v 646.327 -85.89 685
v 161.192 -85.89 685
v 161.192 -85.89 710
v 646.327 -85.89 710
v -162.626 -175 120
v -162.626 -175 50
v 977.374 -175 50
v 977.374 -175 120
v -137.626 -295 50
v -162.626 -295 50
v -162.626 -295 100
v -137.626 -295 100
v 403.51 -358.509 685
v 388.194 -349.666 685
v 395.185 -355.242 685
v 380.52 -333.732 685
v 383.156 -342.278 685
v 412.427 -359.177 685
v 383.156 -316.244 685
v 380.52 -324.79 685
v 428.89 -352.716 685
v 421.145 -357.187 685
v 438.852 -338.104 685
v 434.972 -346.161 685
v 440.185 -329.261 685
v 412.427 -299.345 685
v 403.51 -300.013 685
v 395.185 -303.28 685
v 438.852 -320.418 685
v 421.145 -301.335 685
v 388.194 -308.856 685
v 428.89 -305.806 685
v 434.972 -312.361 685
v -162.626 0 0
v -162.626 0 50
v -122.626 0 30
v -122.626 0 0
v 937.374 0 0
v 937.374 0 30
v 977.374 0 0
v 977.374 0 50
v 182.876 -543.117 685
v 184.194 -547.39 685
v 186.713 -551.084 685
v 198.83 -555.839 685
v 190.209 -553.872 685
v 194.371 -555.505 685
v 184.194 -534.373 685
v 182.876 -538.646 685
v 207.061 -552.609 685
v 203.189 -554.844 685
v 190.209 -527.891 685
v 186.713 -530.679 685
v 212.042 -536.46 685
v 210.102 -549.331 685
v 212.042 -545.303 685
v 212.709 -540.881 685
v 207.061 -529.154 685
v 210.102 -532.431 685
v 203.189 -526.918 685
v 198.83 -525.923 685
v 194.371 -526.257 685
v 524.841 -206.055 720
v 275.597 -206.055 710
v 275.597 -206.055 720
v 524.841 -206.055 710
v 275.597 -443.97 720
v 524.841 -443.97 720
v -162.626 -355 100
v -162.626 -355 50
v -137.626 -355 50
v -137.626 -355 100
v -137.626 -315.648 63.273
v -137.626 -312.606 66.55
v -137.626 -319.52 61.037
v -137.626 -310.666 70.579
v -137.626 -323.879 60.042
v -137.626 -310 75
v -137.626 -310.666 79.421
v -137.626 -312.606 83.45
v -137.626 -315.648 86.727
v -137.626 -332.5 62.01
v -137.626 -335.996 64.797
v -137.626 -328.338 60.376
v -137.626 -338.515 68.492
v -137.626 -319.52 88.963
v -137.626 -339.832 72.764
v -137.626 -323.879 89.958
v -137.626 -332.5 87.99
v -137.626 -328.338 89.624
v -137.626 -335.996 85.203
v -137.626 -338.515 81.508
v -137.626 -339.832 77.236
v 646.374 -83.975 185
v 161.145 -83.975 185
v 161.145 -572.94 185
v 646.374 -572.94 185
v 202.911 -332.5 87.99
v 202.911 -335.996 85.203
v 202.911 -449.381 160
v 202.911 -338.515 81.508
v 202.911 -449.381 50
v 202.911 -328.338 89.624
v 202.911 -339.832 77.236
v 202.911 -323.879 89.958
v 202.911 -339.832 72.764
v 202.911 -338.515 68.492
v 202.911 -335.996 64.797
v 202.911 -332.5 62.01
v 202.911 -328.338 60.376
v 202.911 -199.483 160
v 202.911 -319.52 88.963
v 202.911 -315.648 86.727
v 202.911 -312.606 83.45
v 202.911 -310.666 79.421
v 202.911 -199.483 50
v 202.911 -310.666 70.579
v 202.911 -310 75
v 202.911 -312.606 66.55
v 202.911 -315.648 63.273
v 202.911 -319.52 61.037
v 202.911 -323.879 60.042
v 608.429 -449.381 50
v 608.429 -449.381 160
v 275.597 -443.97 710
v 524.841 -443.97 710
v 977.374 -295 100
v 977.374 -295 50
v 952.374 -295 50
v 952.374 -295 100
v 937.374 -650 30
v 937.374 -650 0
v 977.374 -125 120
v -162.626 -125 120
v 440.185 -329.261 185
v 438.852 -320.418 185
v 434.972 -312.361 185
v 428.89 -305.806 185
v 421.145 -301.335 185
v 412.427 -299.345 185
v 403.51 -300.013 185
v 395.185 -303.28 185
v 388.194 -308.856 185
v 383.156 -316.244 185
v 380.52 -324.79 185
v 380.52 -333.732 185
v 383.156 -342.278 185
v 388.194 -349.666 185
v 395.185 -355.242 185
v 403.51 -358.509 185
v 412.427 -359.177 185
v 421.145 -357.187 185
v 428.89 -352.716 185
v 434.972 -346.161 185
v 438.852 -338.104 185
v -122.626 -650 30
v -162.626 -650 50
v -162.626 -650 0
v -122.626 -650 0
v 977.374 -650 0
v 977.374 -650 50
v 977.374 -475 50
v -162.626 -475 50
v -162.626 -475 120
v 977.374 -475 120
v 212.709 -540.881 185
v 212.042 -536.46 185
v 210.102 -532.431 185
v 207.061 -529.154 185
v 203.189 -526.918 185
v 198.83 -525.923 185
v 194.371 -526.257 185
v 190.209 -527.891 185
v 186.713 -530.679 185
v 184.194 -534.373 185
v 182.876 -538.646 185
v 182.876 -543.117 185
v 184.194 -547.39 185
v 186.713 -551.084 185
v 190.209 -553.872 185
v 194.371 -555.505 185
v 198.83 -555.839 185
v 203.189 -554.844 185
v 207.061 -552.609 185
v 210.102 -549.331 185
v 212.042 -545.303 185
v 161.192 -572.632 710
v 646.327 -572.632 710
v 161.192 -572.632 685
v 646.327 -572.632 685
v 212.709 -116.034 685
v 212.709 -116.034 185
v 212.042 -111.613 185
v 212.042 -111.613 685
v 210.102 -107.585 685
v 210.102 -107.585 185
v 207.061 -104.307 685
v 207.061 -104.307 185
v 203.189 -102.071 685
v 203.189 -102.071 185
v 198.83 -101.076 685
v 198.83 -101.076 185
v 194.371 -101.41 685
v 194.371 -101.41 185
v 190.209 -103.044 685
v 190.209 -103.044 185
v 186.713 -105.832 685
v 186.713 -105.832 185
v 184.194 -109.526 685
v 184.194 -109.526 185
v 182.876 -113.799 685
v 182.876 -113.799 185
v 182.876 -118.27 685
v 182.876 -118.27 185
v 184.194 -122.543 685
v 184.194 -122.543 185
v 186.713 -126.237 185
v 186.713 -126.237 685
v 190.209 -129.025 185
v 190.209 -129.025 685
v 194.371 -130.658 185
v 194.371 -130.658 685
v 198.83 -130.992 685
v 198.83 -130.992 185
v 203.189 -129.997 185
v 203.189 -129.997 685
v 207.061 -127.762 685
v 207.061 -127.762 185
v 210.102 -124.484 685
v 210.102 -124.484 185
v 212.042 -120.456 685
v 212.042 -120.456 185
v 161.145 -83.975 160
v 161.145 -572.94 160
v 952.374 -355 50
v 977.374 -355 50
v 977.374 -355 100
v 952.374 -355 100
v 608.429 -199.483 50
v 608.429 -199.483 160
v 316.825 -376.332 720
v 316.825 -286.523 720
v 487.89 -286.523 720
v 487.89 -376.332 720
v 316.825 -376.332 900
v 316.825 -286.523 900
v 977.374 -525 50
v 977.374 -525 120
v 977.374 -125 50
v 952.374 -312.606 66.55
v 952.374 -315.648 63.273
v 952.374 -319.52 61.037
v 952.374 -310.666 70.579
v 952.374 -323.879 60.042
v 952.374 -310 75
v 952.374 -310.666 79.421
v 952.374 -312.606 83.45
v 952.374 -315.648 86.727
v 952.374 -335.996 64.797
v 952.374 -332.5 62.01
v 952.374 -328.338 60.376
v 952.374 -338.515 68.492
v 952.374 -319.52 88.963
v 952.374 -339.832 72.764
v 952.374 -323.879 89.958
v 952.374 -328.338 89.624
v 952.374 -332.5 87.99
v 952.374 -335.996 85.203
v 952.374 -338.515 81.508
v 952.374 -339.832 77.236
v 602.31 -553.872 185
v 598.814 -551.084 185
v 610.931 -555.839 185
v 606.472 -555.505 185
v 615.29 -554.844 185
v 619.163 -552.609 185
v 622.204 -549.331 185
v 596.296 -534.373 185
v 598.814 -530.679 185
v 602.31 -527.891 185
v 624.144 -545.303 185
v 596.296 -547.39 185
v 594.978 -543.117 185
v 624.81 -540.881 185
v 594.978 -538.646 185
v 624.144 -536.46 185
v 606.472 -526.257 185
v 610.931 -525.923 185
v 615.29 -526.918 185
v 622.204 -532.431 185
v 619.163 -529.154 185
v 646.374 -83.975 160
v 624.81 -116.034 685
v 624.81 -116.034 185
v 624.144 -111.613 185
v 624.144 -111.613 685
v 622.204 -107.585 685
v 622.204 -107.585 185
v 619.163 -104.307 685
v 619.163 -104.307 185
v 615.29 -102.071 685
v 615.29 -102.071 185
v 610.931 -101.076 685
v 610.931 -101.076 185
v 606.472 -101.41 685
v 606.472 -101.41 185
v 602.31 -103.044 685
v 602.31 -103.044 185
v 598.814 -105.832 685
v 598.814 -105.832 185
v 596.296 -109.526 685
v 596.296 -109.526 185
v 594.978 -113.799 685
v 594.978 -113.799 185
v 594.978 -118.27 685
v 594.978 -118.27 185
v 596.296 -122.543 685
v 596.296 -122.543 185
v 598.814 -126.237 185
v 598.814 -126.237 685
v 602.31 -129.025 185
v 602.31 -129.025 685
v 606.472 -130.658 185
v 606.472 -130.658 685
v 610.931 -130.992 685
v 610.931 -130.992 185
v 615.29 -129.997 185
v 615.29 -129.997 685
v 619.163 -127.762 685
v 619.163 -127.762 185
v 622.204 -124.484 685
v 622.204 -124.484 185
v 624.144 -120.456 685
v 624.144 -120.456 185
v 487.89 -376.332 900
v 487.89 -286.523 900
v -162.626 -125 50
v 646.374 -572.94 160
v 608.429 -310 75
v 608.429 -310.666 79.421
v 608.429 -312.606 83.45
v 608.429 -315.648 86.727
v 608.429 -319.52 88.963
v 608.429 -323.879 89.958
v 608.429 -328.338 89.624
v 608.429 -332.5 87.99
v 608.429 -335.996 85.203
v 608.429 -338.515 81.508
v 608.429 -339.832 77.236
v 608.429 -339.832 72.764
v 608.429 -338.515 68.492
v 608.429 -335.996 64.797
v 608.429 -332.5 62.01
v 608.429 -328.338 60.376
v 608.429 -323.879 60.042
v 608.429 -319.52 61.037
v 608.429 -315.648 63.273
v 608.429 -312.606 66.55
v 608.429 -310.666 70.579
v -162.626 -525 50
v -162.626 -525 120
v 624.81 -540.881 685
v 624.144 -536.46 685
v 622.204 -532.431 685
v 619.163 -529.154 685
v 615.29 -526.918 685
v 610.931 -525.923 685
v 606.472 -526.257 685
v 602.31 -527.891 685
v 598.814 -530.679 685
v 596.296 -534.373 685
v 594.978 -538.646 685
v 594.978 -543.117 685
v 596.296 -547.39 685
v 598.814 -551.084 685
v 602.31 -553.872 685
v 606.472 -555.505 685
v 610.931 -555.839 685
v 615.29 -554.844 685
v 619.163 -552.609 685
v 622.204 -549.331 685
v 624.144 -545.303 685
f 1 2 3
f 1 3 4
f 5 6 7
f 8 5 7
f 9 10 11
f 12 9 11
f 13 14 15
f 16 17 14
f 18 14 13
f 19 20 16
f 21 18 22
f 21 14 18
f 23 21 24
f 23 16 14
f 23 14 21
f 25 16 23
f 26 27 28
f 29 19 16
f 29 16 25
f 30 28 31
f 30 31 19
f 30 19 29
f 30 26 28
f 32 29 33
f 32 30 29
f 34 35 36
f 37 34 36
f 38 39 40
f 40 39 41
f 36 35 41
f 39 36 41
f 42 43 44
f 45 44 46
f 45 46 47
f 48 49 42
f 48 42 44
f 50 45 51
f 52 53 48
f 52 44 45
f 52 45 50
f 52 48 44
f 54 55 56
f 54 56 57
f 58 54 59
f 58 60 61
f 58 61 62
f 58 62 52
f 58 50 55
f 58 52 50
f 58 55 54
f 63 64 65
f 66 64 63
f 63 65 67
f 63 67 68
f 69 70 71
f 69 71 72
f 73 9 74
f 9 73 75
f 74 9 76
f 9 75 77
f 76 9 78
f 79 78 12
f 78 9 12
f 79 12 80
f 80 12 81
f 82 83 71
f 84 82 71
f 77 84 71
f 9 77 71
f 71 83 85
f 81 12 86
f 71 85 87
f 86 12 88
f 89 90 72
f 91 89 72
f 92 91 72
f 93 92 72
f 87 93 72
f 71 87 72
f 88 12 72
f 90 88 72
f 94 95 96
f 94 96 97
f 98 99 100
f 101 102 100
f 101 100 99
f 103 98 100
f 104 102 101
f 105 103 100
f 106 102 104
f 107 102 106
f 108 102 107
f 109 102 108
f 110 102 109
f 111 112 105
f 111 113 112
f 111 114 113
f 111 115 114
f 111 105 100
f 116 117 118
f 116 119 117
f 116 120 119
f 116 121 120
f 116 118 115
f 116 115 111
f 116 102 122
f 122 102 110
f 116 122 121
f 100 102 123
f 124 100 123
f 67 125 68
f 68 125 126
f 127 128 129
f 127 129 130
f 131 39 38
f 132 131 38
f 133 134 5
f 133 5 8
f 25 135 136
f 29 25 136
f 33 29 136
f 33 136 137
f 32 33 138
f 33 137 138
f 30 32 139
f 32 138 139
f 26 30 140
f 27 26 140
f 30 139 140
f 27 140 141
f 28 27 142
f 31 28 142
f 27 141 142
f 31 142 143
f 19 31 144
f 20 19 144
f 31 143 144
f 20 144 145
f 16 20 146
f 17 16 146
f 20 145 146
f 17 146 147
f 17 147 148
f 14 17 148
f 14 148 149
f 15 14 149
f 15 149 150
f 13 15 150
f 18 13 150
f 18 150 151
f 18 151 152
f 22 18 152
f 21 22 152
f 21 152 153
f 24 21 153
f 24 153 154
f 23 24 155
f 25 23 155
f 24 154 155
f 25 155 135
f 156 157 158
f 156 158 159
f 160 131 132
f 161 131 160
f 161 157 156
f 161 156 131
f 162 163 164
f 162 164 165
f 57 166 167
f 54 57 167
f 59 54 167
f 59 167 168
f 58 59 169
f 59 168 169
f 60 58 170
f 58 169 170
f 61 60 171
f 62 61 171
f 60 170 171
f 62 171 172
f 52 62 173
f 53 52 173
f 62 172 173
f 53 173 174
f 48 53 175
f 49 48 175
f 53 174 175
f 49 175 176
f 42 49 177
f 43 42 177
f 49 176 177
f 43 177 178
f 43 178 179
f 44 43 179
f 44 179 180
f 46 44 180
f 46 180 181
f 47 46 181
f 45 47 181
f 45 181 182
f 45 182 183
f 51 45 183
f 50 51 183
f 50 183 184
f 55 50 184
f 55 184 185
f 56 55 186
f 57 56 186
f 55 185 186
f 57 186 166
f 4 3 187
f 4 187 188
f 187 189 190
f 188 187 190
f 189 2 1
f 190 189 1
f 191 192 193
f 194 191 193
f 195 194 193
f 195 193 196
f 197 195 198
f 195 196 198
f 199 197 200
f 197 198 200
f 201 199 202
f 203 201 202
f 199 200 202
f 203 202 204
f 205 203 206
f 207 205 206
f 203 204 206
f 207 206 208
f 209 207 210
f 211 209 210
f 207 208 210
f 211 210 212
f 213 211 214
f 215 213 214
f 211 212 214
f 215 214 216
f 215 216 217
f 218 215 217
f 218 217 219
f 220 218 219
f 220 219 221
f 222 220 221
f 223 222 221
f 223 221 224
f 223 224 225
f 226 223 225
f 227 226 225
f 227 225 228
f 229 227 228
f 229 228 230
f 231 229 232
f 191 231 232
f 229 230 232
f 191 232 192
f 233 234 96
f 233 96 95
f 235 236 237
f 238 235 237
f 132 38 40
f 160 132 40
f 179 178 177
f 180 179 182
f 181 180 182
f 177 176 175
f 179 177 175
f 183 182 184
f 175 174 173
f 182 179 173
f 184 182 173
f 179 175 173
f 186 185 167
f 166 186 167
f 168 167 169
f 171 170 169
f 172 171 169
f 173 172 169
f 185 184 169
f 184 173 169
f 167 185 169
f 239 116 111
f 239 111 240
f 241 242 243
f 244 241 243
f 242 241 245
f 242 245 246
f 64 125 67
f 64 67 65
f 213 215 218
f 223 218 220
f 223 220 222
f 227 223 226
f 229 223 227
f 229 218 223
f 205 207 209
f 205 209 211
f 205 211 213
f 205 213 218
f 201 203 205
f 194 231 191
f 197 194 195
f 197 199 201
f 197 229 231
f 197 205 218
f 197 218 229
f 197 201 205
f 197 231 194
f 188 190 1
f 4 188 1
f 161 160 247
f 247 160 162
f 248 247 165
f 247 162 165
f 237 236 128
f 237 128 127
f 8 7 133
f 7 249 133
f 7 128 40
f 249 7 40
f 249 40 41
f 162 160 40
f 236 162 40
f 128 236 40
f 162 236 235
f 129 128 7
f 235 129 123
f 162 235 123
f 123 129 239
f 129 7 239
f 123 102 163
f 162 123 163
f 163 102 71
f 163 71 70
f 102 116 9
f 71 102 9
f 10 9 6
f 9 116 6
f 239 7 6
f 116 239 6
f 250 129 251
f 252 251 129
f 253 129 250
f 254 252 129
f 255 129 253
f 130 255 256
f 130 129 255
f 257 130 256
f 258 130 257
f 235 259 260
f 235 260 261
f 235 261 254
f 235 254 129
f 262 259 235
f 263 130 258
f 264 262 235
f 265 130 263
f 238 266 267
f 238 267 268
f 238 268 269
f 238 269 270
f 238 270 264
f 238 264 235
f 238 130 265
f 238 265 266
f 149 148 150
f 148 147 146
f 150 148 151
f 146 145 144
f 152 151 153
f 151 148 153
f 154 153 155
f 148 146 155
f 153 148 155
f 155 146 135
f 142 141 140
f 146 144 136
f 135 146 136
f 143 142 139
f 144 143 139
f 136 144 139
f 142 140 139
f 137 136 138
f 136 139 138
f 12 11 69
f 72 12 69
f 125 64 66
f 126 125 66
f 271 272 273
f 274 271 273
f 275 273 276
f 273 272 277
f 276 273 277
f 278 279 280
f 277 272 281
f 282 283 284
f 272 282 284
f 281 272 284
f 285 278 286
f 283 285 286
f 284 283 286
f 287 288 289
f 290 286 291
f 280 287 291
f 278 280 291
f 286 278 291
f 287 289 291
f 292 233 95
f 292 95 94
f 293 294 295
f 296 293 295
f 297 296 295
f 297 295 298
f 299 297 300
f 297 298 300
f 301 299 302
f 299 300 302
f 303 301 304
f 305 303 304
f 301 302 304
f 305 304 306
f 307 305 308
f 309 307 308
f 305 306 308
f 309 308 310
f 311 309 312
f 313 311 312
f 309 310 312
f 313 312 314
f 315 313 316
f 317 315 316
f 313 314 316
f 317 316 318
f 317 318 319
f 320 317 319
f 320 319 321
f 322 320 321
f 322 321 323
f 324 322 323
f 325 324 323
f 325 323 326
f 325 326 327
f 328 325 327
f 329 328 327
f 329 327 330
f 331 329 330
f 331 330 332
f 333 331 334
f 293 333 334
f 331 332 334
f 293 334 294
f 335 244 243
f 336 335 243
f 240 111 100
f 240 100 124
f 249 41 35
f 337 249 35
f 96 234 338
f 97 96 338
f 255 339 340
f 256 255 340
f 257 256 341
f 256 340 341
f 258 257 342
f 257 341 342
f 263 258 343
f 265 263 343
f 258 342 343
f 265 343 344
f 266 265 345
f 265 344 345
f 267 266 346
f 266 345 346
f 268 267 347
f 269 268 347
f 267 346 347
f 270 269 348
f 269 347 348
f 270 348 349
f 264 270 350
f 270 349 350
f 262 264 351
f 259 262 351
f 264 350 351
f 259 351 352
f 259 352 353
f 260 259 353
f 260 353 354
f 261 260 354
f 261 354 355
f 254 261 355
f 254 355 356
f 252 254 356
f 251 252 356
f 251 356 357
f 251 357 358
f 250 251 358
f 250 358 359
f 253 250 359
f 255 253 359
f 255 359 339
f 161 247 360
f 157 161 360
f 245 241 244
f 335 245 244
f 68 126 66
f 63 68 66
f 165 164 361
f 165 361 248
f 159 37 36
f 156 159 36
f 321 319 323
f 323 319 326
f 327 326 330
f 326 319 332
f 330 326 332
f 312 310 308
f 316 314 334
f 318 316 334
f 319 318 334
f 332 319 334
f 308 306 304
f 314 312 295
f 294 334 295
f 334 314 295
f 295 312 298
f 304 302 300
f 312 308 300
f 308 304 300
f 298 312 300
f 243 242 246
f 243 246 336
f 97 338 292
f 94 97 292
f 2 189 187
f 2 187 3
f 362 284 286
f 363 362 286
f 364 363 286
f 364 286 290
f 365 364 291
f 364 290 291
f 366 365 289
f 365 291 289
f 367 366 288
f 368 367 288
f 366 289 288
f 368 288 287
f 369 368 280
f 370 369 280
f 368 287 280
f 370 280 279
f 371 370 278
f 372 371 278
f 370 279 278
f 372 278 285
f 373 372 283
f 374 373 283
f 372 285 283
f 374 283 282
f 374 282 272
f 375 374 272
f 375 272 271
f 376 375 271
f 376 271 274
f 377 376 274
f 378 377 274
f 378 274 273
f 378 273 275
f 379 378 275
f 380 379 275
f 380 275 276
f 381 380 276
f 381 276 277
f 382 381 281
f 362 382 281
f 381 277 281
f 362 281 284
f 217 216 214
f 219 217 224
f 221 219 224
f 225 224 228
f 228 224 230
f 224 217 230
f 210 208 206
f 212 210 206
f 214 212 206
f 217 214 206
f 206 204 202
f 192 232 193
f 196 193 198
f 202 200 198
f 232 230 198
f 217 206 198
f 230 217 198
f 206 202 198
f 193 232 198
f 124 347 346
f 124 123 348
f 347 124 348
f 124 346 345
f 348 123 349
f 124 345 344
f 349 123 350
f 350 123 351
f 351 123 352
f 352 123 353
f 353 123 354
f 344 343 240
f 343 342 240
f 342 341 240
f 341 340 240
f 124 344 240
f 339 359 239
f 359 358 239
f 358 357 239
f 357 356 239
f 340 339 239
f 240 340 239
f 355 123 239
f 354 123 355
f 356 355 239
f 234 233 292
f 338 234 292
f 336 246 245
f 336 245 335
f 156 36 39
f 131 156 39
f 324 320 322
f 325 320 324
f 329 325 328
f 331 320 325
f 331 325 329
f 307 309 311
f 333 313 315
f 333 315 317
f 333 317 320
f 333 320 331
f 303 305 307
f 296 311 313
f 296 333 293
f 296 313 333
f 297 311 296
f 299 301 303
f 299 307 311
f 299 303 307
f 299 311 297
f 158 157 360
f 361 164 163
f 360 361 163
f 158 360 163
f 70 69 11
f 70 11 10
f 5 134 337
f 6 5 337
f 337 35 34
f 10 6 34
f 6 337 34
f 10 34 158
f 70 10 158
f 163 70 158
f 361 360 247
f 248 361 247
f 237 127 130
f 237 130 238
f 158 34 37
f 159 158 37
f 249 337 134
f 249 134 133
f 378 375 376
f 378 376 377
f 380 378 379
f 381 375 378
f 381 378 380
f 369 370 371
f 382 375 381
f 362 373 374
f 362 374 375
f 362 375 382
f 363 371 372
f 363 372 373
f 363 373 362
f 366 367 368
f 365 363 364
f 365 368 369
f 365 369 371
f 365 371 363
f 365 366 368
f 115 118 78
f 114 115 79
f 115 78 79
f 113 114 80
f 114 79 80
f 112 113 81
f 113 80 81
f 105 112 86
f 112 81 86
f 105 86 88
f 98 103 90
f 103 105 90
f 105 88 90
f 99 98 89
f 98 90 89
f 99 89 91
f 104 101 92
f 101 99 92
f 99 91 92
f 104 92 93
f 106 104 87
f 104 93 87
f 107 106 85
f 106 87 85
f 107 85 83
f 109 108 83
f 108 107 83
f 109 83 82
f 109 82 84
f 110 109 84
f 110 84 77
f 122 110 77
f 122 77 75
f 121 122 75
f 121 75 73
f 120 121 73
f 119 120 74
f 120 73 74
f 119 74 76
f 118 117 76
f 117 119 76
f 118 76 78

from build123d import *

# Parameters (mm, degrees)
F1_DEPTH  = 650
F2_W      = 60
F2_H      = 50
F3_DEPTH  = 25
F6_R      = 15
F7_DEPTH  = 1090
F8_W      = 1140
F8_H      = 50
F9_DEPTH  = 70
F10_W     = 405.5173546076
F10_H     = 249.8986423016
F11_DEPTH = 110
F12_W     = 485.2297604084
F12_H     = 488.9646247029
F13_DEPTH = 25
F14_R     = 30
F15_DEPTH = 500
F16_W     = 485.1356595755
F16_H     = 486.7420271039
F17_DEPTH = 25
F18_R     = 15
F19_DEPTH = 500
F20_W     = 249.2434680462
F20_H     = 237.9142642021
F21_DEPTH = 10
F22_W     = 171.0648536682
F22_H     = 89.8090600967
F23_DEPTH = 180


with BuildPart() as f1:
    # F0 (on Front) → F1 (new body)
    with BuildSketch(Plane.XZ):
        Polygon((-162.6262263714, 50), (-162.6262263714, 0), (-122.6262263714, 0), (-122.6262263714, 30), (937.3737736286, 30), (937.3737736286, 0), (977.3737736286, 0), (977.3737736286, 50), align=None)
    extrude(amount=F1_DEPTH)

    # F5: F3 across plane


with BuildPart() as f3:
    # F2 (on face) → F3 (new body)
    with BuildSketch(Plane(origin=(-162.6262263714, 0, 0), x_dir=(0, -1, 0), z_dir=(-1, 0, 0))):
        with Locations((325, 75)):
            Rectangle(F2_W, F2_H)
    extrude(amount=-F3_DEPTH)


with BuildPart() as f1_1:
    add(f1.part)
    add(f3.part.mirror(Plane(origin=(407.3737736286, -325, 25), x_dir=(0, -1, 0), z_dir=(-1, 0, 0))))


    add(f3.part)  # F7 merges F3
    # F6 (on face) → F7 (join, through all)
    with BuildSketch(Plane.YZ.offset(-137.6262263714)):
        with Locations((-325, 75)):
            Circle(F6_R)
    extrude(amount=F7_DEPTH)

    # F8 (on face) → F9 (join)
    with BuildSketch(Plane.XY.offset(50)):
        with Locations((407.3737736286, -150)):
            Rectangle(F8_W, F8_H)
        with Locations((407.3737736286, -500)):
            Rectangle(F8_W, F8_H)
    extrude(amount=F9_DEPTH)

    # F10 (on face) → F11 (join)
    with BuildSketch(Plane.XY.offset(50)):
        with Locations((405.6699201465, -324.4320303202)):
            Rectangle(F10_W, F10_H)
    extrude(amount=F11_DEPTH)


with BuildPart() as f13:
    # F12 (on face) → F13 (new body)
    with BuildSketch(Plane.XY.offset(160)):
        with Locations((403.7595242262, -328.4577988088)):
            Rectangle(F12_W, F12_H)
    extrude(amount=F13_DEPTH)


with BuildPart() as f15:
    # F14 (on face) → F15 (new body)
    with BuildSketch(Plane.XY.offset(185)):
        with Locations((410.1851582527, -329.2610049248)):
            Circle(F14_R)
    extrude(amount=F15_DEPTH)


with BuildPart() as f17:
    # F16 (on face) → F17 (new body)
    with BuildSketch(Plane.XY.offset(685)):
        with Locations((403.7595465779, -329.2610011995)):
            Rectangle(F16_W, F16_H)
    extrude(amount=F17_DEPTH)


with BuildPart() as f19:
    # F18 (on face) → F19 (new body, through all)
    with BuildSketch(Plane.XY.offset(185)):
        with Locations((197.7088451385, -116.0343214869)):
            Circle(F18_R)
        with Locations((609.8102033138, -116.0343214869)):
            Circle(F18_R)
        with Locations((197.7088451385, -540.8812761307)):
            Circle(F18_R)
        with Locations((609.8102033138, -540.8812761307)):
            Circle(F18_R)
    extrude(amount=F19_DEPTH)


with BuildPart() as f21:
    # F20 (on face) → F21 (new body)
    with BuildSketch(Plane.XY.offset(710)):
        with Locations((400.2191573381, -325.0125348568)):
            Rectangle(F20_W, F20_H)
    extrude(amount=F21_DEPTH)


with BuildPart() as f23:
    # F22 (on face) → F23 (new body)
    with BuildSketch(Plane.XY.offset(720)):
        with Locations((402.3574590683, -331.4274847507)):
            Rectangle(F22_W, F22_H)
    extrude(amount=F23_DEPTH)


solid = Compound([f1_1.part, f13.part, f15.part, f17.part, f19.part, f21.part, f23.part])
